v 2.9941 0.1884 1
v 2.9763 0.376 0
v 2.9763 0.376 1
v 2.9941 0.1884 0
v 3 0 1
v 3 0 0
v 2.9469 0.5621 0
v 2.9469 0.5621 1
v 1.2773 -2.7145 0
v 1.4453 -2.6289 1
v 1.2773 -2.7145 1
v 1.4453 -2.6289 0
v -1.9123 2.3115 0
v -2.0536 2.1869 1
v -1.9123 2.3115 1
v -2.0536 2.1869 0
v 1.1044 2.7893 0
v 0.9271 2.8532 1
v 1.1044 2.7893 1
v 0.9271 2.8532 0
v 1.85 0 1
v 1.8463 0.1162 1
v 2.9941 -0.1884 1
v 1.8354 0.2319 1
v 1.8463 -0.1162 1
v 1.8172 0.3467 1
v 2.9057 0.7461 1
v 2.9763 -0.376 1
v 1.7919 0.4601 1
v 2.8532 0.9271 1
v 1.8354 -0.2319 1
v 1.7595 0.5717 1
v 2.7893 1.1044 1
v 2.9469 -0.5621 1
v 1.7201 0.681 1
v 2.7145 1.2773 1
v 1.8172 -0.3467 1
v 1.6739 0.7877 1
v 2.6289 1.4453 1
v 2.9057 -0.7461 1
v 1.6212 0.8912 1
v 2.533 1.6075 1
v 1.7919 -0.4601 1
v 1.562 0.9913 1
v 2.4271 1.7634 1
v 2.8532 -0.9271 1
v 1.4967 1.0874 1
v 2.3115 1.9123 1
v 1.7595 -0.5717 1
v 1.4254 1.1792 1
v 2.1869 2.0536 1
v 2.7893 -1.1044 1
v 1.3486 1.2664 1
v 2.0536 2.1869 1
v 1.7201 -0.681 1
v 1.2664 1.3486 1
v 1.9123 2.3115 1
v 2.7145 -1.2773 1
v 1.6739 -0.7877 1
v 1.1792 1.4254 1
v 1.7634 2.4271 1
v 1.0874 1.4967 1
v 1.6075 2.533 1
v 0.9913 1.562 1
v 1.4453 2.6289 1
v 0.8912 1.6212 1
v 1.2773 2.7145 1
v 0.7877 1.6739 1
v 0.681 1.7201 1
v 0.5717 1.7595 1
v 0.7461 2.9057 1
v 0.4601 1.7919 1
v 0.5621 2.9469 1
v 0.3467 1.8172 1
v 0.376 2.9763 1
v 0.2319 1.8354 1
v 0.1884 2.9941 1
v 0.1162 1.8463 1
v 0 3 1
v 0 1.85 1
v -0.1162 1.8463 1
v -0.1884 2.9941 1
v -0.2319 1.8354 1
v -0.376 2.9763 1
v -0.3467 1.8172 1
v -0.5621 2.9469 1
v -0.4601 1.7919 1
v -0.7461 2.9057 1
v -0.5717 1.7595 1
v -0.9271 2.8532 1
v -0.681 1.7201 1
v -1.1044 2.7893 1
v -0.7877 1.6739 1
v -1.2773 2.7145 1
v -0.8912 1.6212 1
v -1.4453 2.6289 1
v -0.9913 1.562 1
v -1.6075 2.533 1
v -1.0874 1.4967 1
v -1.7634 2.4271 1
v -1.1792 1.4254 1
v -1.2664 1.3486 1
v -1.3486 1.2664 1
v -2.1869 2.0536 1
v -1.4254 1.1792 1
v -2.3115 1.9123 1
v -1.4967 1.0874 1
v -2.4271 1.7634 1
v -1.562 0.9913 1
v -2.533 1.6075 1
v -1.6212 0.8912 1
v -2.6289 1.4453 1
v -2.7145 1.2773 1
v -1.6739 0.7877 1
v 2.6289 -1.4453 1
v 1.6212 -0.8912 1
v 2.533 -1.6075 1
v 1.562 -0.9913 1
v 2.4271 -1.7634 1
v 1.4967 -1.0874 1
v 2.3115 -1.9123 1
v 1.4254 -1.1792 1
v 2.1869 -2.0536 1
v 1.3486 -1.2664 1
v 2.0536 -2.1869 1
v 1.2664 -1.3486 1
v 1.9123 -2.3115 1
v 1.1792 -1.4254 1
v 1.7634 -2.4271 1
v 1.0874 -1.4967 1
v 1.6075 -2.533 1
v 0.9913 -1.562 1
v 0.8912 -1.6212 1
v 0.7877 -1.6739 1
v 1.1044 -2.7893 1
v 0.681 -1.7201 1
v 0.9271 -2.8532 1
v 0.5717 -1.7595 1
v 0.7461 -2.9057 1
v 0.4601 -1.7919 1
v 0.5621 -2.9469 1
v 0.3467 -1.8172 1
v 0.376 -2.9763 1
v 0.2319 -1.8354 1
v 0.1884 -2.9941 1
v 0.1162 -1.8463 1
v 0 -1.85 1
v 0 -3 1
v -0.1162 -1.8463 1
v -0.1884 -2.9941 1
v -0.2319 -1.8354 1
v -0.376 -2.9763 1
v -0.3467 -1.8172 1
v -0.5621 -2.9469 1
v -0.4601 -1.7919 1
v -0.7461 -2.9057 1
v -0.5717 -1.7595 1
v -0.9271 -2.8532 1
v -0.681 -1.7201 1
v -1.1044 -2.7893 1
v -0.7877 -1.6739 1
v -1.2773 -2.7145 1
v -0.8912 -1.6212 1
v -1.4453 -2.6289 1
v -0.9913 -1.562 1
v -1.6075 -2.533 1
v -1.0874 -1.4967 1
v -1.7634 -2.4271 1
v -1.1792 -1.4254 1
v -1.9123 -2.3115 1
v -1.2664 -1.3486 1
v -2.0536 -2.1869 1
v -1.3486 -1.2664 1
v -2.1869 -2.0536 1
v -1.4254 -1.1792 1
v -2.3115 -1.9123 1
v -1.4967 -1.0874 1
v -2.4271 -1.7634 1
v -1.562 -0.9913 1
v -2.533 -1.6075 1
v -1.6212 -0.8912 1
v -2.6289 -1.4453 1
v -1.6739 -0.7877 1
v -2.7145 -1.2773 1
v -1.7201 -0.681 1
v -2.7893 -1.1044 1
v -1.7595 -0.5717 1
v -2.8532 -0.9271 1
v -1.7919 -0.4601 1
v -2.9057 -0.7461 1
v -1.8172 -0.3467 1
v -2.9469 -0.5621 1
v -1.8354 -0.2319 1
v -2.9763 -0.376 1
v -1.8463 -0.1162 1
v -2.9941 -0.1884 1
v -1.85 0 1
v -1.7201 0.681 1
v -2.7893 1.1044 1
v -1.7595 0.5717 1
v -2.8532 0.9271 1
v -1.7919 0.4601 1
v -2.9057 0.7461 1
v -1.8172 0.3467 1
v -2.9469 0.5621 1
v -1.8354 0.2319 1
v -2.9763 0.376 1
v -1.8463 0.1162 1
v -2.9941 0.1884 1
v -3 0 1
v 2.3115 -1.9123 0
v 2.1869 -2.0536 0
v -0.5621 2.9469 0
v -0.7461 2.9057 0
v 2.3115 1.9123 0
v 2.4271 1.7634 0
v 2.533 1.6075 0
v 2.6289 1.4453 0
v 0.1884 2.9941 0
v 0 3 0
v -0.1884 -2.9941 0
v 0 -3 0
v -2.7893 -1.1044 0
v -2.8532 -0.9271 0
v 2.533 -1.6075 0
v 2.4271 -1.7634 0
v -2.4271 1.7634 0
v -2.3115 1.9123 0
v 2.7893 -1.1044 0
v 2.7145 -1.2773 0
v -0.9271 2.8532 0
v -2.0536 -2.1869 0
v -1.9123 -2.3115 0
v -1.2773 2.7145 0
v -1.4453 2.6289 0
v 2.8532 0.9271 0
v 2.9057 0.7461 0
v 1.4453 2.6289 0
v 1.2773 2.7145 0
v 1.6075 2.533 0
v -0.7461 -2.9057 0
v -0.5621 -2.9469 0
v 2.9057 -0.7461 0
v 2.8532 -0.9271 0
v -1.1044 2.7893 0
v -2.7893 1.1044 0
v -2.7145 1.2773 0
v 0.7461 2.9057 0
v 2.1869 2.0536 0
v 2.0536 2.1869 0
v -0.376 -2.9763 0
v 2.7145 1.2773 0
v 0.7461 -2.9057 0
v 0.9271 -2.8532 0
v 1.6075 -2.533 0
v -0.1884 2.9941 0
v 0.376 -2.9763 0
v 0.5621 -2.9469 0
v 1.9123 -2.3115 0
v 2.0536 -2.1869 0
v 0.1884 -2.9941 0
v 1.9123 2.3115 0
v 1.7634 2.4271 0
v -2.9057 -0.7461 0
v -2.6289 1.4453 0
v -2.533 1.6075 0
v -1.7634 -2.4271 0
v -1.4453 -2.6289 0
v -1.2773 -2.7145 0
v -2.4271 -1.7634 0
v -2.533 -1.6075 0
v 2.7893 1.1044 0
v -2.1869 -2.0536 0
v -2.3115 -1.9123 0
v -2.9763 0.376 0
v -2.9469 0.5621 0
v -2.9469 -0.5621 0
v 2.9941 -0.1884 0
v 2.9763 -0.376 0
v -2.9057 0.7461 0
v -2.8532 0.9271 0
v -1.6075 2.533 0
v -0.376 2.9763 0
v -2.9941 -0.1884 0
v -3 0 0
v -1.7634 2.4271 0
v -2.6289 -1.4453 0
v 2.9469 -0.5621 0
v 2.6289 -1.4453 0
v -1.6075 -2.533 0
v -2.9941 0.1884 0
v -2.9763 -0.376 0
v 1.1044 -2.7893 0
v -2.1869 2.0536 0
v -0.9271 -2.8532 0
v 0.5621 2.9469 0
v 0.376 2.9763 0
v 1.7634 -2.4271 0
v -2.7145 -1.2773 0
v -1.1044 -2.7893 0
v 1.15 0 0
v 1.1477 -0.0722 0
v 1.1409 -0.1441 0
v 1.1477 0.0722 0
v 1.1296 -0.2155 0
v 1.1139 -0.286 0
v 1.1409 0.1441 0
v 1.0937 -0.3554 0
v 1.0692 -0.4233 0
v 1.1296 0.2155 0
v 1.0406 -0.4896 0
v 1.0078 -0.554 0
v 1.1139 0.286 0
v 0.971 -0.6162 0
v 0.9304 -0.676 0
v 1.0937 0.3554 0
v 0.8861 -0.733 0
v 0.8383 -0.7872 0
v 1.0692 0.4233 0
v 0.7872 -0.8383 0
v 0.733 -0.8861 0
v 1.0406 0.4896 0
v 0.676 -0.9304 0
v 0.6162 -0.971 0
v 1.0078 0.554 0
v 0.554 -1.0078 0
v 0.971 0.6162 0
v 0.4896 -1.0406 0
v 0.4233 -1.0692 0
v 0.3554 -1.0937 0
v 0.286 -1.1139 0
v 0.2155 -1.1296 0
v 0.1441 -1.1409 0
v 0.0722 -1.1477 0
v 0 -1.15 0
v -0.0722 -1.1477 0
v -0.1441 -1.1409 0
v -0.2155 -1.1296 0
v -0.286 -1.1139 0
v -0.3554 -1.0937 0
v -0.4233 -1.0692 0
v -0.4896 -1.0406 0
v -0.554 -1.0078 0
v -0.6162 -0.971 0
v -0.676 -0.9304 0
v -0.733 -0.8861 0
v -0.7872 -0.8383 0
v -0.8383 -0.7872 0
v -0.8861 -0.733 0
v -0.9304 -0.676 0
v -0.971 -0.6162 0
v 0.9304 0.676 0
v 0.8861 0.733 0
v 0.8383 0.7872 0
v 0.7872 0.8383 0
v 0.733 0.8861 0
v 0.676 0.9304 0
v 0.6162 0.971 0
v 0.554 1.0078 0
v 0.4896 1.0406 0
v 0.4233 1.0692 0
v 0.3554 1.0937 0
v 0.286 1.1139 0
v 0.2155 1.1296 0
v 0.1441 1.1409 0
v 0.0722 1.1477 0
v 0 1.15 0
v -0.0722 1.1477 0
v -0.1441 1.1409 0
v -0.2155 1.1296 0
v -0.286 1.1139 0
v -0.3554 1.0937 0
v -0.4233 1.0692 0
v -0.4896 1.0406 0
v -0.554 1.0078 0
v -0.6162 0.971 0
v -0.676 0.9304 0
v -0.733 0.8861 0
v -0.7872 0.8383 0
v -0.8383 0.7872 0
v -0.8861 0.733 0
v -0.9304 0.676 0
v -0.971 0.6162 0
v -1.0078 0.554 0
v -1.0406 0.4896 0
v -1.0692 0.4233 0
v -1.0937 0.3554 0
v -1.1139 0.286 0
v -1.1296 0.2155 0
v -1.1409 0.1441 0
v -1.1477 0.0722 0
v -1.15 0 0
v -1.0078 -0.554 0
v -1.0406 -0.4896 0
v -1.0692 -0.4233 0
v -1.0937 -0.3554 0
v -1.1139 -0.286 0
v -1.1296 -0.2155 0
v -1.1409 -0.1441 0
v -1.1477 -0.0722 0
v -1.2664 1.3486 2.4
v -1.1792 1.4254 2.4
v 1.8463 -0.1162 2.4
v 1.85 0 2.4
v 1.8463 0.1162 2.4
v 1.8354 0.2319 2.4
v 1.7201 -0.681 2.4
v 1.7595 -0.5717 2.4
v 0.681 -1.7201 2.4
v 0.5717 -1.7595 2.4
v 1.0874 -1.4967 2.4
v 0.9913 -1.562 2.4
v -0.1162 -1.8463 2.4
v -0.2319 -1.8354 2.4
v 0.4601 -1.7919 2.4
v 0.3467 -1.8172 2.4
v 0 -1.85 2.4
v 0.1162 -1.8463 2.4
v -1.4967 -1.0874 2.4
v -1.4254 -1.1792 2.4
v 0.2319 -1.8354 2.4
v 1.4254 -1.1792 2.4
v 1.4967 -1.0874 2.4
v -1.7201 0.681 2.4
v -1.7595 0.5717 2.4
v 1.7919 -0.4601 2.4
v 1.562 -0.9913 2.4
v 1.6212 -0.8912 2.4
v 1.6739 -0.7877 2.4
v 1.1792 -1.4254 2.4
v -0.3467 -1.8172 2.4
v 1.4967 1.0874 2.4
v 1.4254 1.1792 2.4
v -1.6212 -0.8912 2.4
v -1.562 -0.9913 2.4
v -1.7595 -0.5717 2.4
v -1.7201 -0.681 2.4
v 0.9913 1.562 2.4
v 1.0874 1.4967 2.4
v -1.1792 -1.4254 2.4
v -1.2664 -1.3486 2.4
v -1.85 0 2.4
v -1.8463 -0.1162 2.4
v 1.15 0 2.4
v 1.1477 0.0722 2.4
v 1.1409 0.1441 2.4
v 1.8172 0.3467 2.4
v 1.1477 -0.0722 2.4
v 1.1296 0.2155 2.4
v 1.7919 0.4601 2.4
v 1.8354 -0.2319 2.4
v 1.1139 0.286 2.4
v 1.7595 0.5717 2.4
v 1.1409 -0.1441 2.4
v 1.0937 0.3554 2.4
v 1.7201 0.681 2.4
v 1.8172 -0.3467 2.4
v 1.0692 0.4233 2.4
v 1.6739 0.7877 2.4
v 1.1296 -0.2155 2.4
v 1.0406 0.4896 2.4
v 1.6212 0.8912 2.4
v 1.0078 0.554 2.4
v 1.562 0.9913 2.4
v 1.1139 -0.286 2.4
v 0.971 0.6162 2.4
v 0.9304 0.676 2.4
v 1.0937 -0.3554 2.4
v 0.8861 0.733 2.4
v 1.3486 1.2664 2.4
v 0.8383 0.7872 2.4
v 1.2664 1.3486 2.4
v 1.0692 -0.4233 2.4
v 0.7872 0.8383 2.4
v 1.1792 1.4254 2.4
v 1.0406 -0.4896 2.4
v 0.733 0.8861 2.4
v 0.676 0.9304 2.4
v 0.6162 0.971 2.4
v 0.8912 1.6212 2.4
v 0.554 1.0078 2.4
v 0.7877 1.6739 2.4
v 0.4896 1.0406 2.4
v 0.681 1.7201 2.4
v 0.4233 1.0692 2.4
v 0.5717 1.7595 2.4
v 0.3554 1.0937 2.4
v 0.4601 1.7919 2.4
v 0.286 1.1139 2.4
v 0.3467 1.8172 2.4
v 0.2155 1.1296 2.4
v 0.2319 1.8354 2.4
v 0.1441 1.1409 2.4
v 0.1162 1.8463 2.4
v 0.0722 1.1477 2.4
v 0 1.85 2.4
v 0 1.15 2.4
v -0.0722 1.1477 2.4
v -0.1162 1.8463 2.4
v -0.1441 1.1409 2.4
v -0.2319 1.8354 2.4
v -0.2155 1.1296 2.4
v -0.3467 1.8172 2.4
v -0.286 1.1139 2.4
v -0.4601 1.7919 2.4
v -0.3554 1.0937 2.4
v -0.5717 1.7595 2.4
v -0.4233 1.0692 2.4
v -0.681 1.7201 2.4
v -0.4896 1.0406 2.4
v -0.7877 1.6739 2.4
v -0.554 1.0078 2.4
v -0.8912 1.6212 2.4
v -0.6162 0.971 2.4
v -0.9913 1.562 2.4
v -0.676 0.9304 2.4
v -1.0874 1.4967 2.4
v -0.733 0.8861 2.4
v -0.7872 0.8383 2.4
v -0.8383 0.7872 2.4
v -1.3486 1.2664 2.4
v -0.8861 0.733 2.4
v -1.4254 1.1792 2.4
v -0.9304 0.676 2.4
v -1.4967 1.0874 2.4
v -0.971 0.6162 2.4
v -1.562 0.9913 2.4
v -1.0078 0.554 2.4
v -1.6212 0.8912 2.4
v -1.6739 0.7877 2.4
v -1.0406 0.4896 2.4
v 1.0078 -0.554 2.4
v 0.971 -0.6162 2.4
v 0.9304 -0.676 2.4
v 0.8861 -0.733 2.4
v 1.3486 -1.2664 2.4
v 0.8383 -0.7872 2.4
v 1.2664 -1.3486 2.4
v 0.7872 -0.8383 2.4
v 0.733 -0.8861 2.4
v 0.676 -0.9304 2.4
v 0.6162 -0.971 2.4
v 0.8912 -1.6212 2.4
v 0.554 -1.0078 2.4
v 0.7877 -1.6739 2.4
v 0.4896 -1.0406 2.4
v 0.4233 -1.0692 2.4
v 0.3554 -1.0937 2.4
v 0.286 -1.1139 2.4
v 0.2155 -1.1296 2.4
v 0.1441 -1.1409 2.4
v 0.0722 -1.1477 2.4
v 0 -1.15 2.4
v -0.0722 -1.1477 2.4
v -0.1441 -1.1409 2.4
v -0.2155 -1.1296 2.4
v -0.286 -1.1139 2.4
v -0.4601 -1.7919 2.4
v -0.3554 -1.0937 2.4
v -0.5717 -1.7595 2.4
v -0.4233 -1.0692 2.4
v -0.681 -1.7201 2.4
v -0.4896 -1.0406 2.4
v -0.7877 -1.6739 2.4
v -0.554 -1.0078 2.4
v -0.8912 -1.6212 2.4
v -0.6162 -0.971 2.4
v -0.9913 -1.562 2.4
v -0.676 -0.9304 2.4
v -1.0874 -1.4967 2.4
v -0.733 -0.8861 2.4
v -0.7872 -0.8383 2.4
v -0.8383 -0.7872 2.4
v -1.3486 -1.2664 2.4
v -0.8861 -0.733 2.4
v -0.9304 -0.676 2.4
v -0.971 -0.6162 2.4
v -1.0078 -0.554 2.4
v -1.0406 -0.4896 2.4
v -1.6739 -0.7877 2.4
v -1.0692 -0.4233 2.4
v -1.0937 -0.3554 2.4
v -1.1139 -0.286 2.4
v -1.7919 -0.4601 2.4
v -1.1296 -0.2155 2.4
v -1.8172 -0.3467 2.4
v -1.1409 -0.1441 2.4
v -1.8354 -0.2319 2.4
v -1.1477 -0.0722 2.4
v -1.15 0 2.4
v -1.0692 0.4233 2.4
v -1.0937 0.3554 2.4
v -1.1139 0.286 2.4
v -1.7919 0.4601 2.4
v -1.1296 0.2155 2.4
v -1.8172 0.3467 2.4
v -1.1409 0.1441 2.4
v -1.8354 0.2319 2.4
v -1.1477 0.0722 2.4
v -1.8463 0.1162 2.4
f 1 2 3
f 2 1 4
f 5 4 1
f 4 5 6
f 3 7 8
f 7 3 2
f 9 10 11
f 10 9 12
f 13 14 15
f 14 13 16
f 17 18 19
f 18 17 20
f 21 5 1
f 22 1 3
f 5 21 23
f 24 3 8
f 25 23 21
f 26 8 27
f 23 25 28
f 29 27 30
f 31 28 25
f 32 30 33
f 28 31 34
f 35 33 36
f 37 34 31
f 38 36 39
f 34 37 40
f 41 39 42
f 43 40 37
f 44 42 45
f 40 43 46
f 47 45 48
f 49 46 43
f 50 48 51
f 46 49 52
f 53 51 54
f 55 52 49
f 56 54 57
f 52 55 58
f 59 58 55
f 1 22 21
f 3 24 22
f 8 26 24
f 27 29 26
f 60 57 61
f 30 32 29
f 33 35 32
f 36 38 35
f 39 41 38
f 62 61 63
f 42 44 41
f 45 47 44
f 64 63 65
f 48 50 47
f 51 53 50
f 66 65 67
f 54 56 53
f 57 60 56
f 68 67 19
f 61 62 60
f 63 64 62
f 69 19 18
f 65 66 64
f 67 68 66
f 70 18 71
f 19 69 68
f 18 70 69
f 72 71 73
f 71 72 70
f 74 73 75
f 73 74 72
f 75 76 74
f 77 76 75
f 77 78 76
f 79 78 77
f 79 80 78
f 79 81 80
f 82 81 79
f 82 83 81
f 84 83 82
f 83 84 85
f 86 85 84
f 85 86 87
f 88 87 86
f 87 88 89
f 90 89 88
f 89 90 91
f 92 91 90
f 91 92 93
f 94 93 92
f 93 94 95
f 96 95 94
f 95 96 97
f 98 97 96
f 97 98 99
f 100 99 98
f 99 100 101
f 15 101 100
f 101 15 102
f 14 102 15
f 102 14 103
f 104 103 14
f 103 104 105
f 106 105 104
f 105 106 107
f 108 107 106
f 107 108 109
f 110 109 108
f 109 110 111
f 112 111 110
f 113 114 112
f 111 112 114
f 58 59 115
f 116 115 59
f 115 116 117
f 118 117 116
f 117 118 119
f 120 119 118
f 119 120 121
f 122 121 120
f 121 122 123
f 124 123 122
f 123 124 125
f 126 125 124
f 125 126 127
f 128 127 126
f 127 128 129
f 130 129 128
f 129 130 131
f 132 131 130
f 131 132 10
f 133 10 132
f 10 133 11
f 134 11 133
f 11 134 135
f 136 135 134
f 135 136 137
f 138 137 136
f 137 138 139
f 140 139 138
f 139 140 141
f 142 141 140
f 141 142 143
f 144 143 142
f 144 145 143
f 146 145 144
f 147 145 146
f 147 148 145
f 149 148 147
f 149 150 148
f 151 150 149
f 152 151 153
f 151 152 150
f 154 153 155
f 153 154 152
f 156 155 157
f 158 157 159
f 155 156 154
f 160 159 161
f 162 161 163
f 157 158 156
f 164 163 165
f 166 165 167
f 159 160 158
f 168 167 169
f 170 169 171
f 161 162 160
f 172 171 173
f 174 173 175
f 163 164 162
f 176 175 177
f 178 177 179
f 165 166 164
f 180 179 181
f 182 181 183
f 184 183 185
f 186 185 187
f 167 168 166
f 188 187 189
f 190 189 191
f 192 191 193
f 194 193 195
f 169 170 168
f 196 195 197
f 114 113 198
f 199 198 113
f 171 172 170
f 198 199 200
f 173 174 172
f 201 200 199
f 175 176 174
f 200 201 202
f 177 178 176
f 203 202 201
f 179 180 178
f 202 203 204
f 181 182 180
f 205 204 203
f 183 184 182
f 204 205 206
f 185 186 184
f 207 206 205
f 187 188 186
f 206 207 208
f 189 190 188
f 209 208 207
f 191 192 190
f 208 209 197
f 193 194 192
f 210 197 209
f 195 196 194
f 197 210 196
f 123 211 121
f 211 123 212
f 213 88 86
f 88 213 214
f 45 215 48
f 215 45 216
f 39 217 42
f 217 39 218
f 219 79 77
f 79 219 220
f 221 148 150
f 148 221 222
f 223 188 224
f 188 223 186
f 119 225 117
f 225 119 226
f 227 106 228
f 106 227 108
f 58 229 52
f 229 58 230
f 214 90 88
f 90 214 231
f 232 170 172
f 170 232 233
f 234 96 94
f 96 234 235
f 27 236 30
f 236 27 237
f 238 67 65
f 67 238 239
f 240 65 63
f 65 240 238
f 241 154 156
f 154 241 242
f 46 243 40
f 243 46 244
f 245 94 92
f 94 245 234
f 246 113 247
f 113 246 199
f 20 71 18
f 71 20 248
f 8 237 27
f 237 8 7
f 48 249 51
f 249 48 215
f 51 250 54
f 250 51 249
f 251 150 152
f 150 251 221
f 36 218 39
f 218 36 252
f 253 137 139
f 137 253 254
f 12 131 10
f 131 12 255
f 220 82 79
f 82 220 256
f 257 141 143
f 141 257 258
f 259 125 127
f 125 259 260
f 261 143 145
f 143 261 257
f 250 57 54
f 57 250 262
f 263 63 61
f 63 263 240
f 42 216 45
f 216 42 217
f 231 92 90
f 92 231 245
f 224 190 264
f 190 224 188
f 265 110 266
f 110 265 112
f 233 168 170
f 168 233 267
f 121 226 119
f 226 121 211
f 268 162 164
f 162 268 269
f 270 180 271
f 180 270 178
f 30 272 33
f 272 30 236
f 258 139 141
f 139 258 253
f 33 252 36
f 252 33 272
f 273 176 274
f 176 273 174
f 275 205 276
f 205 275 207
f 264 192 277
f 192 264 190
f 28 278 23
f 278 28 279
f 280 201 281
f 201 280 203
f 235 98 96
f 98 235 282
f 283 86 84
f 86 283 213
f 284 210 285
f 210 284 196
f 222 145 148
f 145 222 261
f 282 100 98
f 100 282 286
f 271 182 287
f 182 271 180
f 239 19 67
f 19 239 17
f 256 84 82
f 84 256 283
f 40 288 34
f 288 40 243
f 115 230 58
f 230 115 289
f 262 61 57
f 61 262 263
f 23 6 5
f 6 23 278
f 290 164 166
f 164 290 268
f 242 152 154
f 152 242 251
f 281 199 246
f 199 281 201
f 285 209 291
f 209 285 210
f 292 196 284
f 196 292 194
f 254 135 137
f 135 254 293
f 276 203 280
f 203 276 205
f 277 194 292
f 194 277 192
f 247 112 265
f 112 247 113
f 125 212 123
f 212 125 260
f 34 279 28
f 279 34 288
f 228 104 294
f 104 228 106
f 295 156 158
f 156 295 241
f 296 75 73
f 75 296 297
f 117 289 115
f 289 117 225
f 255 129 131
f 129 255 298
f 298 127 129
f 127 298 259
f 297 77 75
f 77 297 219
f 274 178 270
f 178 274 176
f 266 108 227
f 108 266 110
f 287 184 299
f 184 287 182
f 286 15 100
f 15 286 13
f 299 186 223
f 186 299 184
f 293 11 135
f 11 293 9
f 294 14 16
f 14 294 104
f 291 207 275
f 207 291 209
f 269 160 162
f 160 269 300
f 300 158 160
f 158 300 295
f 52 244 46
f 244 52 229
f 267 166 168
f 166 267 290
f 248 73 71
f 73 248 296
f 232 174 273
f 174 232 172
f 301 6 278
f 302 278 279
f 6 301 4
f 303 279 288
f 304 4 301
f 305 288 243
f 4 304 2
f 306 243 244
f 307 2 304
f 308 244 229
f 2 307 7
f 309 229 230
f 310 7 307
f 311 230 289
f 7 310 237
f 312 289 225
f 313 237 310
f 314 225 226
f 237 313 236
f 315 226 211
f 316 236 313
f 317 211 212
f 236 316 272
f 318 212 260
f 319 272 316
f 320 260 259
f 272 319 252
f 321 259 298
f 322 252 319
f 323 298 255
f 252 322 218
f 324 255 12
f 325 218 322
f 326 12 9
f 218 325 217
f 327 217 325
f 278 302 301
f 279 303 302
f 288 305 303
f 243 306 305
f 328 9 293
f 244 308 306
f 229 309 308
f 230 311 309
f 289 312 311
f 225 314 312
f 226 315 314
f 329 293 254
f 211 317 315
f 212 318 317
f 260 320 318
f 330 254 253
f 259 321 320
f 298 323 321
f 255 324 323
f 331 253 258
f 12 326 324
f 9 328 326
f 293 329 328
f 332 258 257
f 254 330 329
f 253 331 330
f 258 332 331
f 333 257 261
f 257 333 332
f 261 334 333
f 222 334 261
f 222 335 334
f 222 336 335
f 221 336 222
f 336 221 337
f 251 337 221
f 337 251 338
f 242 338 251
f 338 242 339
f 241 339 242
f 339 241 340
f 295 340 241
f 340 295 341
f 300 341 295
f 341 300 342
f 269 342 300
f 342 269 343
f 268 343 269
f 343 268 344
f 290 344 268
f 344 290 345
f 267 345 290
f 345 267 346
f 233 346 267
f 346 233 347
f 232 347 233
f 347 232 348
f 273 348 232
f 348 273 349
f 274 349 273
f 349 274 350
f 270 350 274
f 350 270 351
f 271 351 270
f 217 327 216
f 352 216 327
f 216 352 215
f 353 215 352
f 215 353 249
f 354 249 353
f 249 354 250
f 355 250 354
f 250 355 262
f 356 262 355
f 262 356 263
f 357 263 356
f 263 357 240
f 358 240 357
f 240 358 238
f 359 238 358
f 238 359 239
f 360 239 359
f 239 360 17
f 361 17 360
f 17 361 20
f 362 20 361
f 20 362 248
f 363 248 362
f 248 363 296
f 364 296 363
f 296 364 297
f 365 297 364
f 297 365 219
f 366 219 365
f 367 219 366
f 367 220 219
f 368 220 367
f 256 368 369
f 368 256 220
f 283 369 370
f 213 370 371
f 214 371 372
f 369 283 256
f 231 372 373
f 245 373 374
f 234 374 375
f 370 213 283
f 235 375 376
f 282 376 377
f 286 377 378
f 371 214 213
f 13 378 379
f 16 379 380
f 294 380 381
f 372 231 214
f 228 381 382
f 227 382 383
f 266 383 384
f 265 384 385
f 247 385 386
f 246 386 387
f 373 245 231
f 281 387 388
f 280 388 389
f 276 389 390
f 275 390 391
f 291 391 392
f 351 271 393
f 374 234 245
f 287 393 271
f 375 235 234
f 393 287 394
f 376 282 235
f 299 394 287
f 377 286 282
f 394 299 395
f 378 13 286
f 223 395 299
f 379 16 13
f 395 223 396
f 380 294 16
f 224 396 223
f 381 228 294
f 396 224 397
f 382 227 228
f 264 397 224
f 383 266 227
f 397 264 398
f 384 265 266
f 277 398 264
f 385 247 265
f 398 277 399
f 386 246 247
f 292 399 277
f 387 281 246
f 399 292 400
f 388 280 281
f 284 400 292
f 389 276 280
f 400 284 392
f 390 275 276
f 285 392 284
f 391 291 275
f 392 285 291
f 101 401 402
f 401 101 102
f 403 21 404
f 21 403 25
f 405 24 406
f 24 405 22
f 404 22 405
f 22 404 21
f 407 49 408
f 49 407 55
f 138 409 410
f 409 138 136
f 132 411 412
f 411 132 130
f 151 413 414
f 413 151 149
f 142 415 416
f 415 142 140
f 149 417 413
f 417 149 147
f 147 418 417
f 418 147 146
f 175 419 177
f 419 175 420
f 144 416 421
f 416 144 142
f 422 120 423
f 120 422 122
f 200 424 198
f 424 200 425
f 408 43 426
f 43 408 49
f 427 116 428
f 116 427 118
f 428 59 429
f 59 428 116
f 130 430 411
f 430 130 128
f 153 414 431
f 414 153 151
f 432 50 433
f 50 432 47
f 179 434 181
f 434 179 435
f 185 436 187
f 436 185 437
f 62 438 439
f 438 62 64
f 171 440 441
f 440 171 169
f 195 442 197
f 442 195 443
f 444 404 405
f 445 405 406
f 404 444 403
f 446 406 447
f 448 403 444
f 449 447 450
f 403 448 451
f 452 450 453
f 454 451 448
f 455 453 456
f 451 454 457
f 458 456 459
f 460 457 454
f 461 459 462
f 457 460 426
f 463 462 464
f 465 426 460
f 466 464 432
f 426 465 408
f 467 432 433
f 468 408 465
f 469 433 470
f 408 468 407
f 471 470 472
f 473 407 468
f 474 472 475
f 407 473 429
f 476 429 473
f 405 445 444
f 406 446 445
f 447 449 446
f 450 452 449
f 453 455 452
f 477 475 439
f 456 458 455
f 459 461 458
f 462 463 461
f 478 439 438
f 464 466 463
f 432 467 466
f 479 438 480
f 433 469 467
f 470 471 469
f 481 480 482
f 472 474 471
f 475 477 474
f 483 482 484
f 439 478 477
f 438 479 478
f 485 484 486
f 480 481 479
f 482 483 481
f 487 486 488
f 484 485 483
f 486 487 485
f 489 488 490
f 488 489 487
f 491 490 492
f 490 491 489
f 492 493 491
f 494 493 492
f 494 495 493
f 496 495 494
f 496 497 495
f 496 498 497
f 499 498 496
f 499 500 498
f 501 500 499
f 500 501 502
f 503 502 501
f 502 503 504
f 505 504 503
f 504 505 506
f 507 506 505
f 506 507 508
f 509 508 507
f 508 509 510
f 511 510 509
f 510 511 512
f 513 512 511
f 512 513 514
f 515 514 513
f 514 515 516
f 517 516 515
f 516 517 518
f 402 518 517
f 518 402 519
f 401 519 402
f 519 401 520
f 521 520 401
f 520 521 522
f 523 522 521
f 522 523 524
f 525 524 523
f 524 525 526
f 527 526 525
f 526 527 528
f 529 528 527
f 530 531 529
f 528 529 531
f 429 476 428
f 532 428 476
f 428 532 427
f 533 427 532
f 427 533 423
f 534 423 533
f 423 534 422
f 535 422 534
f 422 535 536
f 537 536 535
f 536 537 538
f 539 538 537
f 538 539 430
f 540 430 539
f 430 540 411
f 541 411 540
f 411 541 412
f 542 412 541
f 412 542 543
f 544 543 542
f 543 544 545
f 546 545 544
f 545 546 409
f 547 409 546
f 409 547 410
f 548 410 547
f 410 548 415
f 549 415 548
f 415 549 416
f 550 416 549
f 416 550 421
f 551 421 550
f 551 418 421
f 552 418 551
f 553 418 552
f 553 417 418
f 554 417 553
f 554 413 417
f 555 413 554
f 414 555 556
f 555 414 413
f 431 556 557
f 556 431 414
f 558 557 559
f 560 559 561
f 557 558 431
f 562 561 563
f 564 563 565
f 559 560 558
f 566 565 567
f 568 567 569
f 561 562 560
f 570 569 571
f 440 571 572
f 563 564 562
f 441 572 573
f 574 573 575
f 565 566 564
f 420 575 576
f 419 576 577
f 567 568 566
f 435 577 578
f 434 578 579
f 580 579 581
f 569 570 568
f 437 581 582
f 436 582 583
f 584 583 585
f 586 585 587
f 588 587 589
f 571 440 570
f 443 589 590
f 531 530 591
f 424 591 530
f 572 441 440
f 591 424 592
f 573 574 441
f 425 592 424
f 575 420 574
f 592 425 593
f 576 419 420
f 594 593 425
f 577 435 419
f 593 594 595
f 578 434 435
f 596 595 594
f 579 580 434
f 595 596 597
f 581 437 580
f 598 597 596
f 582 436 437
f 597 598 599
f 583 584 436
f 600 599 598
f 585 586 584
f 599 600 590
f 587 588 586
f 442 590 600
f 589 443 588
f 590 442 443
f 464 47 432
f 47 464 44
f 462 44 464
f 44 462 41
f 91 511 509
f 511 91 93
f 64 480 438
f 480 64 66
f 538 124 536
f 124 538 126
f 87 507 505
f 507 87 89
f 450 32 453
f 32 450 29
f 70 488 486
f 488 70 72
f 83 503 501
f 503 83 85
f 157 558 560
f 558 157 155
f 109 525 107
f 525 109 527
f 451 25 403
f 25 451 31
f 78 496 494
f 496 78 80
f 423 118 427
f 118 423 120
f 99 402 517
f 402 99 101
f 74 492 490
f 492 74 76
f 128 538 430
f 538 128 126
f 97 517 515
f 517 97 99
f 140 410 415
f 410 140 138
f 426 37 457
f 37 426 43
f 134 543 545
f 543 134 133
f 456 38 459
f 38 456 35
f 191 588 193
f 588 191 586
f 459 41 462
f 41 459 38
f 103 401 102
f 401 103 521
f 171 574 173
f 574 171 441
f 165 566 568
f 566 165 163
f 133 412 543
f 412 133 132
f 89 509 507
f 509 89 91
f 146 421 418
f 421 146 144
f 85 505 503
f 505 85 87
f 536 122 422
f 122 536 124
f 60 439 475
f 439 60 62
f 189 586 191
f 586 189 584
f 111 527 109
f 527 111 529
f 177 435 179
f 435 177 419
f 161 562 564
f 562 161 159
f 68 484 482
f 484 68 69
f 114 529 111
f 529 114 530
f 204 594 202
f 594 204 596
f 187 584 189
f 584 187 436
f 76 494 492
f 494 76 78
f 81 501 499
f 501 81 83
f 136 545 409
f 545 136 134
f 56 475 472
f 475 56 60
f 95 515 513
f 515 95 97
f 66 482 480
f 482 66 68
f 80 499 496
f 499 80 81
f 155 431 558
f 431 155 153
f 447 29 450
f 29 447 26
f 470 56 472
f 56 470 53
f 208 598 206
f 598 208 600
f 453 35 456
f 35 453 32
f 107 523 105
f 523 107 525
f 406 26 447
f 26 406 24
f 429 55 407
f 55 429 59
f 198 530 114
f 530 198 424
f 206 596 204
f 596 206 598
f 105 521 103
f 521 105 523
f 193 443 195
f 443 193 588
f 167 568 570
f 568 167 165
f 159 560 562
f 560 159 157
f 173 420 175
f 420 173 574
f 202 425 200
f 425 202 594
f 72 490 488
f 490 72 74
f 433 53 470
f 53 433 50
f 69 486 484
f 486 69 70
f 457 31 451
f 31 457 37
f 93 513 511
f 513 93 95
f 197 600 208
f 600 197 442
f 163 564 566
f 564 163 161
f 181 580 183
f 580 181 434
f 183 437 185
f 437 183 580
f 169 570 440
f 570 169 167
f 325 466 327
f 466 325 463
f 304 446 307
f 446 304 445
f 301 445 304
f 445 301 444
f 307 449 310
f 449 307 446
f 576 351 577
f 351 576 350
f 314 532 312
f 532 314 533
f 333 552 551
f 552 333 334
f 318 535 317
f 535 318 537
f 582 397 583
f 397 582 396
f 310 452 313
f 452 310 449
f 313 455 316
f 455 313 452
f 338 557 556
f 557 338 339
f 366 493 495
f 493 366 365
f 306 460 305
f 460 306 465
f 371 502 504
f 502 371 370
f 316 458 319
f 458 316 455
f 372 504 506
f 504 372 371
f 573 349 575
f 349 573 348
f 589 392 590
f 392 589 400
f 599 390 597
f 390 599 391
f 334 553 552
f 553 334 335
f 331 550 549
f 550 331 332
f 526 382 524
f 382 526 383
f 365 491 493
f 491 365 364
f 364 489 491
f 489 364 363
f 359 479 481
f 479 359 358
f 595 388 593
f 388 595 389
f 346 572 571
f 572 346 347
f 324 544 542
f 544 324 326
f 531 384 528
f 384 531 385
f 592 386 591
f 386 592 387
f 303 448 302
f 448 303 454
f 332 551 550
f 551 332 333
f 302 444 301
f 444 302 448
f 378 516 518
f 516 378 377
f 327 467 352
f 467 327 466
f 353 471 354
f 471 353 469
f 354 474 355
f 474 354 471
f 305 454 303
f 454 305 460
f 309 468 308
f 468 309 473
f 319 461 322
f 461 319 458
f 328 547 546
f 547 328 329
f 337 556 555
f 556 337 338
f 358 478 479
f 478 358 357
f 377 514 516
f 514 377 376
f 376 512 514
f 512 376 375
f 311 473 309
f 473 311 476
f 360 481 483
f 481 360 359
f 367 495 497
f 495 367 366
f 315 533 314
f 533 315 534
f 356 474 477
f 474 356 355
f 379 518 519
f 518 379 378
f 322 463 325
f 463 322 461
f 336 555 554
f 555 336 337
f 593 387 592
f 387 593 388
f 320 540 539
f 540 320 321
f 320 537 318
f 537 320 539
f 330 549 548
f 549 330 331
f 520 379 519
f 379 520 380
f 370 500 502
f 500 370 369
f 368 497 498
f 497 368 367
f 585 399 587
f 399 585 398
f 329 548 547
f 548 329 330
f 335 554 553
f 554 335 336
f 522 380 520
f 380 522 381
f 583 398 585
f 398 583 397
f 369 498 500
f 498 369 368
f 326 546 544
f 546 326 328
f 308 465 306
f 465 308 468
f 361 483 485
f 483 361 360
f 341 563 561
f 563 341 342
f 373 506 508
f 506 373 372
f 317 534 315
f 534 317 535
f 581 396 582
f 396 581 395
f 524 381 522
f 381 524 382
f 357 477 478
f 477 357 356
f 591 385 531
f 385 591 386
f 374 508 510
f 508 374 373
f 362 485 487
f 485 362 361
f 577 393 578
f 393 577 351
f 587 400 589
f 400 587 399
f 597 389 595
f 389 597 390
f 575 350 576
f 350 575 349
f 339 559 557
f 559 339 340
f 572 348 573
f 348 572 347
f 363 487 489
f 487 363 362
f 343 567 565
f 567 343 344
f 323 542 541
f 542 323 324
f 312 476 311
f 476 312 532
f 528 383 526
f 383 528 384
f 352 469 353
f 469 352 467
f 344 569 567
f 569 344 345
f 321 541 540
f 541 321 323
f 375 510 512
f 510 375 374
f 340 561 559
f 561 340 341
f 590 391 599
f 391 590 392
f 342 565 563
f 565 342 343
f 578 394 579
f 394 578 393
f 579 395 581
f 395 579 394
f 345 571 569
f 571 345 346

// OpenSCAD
$fn = 100;

difference()
{
    union()
    {
        cylinder(h = 1, d = 6);
        cylinder(h = 2.4, d = 3.7);
    }
    cylinder(h = 20, d = 2.3, center = true);
}
